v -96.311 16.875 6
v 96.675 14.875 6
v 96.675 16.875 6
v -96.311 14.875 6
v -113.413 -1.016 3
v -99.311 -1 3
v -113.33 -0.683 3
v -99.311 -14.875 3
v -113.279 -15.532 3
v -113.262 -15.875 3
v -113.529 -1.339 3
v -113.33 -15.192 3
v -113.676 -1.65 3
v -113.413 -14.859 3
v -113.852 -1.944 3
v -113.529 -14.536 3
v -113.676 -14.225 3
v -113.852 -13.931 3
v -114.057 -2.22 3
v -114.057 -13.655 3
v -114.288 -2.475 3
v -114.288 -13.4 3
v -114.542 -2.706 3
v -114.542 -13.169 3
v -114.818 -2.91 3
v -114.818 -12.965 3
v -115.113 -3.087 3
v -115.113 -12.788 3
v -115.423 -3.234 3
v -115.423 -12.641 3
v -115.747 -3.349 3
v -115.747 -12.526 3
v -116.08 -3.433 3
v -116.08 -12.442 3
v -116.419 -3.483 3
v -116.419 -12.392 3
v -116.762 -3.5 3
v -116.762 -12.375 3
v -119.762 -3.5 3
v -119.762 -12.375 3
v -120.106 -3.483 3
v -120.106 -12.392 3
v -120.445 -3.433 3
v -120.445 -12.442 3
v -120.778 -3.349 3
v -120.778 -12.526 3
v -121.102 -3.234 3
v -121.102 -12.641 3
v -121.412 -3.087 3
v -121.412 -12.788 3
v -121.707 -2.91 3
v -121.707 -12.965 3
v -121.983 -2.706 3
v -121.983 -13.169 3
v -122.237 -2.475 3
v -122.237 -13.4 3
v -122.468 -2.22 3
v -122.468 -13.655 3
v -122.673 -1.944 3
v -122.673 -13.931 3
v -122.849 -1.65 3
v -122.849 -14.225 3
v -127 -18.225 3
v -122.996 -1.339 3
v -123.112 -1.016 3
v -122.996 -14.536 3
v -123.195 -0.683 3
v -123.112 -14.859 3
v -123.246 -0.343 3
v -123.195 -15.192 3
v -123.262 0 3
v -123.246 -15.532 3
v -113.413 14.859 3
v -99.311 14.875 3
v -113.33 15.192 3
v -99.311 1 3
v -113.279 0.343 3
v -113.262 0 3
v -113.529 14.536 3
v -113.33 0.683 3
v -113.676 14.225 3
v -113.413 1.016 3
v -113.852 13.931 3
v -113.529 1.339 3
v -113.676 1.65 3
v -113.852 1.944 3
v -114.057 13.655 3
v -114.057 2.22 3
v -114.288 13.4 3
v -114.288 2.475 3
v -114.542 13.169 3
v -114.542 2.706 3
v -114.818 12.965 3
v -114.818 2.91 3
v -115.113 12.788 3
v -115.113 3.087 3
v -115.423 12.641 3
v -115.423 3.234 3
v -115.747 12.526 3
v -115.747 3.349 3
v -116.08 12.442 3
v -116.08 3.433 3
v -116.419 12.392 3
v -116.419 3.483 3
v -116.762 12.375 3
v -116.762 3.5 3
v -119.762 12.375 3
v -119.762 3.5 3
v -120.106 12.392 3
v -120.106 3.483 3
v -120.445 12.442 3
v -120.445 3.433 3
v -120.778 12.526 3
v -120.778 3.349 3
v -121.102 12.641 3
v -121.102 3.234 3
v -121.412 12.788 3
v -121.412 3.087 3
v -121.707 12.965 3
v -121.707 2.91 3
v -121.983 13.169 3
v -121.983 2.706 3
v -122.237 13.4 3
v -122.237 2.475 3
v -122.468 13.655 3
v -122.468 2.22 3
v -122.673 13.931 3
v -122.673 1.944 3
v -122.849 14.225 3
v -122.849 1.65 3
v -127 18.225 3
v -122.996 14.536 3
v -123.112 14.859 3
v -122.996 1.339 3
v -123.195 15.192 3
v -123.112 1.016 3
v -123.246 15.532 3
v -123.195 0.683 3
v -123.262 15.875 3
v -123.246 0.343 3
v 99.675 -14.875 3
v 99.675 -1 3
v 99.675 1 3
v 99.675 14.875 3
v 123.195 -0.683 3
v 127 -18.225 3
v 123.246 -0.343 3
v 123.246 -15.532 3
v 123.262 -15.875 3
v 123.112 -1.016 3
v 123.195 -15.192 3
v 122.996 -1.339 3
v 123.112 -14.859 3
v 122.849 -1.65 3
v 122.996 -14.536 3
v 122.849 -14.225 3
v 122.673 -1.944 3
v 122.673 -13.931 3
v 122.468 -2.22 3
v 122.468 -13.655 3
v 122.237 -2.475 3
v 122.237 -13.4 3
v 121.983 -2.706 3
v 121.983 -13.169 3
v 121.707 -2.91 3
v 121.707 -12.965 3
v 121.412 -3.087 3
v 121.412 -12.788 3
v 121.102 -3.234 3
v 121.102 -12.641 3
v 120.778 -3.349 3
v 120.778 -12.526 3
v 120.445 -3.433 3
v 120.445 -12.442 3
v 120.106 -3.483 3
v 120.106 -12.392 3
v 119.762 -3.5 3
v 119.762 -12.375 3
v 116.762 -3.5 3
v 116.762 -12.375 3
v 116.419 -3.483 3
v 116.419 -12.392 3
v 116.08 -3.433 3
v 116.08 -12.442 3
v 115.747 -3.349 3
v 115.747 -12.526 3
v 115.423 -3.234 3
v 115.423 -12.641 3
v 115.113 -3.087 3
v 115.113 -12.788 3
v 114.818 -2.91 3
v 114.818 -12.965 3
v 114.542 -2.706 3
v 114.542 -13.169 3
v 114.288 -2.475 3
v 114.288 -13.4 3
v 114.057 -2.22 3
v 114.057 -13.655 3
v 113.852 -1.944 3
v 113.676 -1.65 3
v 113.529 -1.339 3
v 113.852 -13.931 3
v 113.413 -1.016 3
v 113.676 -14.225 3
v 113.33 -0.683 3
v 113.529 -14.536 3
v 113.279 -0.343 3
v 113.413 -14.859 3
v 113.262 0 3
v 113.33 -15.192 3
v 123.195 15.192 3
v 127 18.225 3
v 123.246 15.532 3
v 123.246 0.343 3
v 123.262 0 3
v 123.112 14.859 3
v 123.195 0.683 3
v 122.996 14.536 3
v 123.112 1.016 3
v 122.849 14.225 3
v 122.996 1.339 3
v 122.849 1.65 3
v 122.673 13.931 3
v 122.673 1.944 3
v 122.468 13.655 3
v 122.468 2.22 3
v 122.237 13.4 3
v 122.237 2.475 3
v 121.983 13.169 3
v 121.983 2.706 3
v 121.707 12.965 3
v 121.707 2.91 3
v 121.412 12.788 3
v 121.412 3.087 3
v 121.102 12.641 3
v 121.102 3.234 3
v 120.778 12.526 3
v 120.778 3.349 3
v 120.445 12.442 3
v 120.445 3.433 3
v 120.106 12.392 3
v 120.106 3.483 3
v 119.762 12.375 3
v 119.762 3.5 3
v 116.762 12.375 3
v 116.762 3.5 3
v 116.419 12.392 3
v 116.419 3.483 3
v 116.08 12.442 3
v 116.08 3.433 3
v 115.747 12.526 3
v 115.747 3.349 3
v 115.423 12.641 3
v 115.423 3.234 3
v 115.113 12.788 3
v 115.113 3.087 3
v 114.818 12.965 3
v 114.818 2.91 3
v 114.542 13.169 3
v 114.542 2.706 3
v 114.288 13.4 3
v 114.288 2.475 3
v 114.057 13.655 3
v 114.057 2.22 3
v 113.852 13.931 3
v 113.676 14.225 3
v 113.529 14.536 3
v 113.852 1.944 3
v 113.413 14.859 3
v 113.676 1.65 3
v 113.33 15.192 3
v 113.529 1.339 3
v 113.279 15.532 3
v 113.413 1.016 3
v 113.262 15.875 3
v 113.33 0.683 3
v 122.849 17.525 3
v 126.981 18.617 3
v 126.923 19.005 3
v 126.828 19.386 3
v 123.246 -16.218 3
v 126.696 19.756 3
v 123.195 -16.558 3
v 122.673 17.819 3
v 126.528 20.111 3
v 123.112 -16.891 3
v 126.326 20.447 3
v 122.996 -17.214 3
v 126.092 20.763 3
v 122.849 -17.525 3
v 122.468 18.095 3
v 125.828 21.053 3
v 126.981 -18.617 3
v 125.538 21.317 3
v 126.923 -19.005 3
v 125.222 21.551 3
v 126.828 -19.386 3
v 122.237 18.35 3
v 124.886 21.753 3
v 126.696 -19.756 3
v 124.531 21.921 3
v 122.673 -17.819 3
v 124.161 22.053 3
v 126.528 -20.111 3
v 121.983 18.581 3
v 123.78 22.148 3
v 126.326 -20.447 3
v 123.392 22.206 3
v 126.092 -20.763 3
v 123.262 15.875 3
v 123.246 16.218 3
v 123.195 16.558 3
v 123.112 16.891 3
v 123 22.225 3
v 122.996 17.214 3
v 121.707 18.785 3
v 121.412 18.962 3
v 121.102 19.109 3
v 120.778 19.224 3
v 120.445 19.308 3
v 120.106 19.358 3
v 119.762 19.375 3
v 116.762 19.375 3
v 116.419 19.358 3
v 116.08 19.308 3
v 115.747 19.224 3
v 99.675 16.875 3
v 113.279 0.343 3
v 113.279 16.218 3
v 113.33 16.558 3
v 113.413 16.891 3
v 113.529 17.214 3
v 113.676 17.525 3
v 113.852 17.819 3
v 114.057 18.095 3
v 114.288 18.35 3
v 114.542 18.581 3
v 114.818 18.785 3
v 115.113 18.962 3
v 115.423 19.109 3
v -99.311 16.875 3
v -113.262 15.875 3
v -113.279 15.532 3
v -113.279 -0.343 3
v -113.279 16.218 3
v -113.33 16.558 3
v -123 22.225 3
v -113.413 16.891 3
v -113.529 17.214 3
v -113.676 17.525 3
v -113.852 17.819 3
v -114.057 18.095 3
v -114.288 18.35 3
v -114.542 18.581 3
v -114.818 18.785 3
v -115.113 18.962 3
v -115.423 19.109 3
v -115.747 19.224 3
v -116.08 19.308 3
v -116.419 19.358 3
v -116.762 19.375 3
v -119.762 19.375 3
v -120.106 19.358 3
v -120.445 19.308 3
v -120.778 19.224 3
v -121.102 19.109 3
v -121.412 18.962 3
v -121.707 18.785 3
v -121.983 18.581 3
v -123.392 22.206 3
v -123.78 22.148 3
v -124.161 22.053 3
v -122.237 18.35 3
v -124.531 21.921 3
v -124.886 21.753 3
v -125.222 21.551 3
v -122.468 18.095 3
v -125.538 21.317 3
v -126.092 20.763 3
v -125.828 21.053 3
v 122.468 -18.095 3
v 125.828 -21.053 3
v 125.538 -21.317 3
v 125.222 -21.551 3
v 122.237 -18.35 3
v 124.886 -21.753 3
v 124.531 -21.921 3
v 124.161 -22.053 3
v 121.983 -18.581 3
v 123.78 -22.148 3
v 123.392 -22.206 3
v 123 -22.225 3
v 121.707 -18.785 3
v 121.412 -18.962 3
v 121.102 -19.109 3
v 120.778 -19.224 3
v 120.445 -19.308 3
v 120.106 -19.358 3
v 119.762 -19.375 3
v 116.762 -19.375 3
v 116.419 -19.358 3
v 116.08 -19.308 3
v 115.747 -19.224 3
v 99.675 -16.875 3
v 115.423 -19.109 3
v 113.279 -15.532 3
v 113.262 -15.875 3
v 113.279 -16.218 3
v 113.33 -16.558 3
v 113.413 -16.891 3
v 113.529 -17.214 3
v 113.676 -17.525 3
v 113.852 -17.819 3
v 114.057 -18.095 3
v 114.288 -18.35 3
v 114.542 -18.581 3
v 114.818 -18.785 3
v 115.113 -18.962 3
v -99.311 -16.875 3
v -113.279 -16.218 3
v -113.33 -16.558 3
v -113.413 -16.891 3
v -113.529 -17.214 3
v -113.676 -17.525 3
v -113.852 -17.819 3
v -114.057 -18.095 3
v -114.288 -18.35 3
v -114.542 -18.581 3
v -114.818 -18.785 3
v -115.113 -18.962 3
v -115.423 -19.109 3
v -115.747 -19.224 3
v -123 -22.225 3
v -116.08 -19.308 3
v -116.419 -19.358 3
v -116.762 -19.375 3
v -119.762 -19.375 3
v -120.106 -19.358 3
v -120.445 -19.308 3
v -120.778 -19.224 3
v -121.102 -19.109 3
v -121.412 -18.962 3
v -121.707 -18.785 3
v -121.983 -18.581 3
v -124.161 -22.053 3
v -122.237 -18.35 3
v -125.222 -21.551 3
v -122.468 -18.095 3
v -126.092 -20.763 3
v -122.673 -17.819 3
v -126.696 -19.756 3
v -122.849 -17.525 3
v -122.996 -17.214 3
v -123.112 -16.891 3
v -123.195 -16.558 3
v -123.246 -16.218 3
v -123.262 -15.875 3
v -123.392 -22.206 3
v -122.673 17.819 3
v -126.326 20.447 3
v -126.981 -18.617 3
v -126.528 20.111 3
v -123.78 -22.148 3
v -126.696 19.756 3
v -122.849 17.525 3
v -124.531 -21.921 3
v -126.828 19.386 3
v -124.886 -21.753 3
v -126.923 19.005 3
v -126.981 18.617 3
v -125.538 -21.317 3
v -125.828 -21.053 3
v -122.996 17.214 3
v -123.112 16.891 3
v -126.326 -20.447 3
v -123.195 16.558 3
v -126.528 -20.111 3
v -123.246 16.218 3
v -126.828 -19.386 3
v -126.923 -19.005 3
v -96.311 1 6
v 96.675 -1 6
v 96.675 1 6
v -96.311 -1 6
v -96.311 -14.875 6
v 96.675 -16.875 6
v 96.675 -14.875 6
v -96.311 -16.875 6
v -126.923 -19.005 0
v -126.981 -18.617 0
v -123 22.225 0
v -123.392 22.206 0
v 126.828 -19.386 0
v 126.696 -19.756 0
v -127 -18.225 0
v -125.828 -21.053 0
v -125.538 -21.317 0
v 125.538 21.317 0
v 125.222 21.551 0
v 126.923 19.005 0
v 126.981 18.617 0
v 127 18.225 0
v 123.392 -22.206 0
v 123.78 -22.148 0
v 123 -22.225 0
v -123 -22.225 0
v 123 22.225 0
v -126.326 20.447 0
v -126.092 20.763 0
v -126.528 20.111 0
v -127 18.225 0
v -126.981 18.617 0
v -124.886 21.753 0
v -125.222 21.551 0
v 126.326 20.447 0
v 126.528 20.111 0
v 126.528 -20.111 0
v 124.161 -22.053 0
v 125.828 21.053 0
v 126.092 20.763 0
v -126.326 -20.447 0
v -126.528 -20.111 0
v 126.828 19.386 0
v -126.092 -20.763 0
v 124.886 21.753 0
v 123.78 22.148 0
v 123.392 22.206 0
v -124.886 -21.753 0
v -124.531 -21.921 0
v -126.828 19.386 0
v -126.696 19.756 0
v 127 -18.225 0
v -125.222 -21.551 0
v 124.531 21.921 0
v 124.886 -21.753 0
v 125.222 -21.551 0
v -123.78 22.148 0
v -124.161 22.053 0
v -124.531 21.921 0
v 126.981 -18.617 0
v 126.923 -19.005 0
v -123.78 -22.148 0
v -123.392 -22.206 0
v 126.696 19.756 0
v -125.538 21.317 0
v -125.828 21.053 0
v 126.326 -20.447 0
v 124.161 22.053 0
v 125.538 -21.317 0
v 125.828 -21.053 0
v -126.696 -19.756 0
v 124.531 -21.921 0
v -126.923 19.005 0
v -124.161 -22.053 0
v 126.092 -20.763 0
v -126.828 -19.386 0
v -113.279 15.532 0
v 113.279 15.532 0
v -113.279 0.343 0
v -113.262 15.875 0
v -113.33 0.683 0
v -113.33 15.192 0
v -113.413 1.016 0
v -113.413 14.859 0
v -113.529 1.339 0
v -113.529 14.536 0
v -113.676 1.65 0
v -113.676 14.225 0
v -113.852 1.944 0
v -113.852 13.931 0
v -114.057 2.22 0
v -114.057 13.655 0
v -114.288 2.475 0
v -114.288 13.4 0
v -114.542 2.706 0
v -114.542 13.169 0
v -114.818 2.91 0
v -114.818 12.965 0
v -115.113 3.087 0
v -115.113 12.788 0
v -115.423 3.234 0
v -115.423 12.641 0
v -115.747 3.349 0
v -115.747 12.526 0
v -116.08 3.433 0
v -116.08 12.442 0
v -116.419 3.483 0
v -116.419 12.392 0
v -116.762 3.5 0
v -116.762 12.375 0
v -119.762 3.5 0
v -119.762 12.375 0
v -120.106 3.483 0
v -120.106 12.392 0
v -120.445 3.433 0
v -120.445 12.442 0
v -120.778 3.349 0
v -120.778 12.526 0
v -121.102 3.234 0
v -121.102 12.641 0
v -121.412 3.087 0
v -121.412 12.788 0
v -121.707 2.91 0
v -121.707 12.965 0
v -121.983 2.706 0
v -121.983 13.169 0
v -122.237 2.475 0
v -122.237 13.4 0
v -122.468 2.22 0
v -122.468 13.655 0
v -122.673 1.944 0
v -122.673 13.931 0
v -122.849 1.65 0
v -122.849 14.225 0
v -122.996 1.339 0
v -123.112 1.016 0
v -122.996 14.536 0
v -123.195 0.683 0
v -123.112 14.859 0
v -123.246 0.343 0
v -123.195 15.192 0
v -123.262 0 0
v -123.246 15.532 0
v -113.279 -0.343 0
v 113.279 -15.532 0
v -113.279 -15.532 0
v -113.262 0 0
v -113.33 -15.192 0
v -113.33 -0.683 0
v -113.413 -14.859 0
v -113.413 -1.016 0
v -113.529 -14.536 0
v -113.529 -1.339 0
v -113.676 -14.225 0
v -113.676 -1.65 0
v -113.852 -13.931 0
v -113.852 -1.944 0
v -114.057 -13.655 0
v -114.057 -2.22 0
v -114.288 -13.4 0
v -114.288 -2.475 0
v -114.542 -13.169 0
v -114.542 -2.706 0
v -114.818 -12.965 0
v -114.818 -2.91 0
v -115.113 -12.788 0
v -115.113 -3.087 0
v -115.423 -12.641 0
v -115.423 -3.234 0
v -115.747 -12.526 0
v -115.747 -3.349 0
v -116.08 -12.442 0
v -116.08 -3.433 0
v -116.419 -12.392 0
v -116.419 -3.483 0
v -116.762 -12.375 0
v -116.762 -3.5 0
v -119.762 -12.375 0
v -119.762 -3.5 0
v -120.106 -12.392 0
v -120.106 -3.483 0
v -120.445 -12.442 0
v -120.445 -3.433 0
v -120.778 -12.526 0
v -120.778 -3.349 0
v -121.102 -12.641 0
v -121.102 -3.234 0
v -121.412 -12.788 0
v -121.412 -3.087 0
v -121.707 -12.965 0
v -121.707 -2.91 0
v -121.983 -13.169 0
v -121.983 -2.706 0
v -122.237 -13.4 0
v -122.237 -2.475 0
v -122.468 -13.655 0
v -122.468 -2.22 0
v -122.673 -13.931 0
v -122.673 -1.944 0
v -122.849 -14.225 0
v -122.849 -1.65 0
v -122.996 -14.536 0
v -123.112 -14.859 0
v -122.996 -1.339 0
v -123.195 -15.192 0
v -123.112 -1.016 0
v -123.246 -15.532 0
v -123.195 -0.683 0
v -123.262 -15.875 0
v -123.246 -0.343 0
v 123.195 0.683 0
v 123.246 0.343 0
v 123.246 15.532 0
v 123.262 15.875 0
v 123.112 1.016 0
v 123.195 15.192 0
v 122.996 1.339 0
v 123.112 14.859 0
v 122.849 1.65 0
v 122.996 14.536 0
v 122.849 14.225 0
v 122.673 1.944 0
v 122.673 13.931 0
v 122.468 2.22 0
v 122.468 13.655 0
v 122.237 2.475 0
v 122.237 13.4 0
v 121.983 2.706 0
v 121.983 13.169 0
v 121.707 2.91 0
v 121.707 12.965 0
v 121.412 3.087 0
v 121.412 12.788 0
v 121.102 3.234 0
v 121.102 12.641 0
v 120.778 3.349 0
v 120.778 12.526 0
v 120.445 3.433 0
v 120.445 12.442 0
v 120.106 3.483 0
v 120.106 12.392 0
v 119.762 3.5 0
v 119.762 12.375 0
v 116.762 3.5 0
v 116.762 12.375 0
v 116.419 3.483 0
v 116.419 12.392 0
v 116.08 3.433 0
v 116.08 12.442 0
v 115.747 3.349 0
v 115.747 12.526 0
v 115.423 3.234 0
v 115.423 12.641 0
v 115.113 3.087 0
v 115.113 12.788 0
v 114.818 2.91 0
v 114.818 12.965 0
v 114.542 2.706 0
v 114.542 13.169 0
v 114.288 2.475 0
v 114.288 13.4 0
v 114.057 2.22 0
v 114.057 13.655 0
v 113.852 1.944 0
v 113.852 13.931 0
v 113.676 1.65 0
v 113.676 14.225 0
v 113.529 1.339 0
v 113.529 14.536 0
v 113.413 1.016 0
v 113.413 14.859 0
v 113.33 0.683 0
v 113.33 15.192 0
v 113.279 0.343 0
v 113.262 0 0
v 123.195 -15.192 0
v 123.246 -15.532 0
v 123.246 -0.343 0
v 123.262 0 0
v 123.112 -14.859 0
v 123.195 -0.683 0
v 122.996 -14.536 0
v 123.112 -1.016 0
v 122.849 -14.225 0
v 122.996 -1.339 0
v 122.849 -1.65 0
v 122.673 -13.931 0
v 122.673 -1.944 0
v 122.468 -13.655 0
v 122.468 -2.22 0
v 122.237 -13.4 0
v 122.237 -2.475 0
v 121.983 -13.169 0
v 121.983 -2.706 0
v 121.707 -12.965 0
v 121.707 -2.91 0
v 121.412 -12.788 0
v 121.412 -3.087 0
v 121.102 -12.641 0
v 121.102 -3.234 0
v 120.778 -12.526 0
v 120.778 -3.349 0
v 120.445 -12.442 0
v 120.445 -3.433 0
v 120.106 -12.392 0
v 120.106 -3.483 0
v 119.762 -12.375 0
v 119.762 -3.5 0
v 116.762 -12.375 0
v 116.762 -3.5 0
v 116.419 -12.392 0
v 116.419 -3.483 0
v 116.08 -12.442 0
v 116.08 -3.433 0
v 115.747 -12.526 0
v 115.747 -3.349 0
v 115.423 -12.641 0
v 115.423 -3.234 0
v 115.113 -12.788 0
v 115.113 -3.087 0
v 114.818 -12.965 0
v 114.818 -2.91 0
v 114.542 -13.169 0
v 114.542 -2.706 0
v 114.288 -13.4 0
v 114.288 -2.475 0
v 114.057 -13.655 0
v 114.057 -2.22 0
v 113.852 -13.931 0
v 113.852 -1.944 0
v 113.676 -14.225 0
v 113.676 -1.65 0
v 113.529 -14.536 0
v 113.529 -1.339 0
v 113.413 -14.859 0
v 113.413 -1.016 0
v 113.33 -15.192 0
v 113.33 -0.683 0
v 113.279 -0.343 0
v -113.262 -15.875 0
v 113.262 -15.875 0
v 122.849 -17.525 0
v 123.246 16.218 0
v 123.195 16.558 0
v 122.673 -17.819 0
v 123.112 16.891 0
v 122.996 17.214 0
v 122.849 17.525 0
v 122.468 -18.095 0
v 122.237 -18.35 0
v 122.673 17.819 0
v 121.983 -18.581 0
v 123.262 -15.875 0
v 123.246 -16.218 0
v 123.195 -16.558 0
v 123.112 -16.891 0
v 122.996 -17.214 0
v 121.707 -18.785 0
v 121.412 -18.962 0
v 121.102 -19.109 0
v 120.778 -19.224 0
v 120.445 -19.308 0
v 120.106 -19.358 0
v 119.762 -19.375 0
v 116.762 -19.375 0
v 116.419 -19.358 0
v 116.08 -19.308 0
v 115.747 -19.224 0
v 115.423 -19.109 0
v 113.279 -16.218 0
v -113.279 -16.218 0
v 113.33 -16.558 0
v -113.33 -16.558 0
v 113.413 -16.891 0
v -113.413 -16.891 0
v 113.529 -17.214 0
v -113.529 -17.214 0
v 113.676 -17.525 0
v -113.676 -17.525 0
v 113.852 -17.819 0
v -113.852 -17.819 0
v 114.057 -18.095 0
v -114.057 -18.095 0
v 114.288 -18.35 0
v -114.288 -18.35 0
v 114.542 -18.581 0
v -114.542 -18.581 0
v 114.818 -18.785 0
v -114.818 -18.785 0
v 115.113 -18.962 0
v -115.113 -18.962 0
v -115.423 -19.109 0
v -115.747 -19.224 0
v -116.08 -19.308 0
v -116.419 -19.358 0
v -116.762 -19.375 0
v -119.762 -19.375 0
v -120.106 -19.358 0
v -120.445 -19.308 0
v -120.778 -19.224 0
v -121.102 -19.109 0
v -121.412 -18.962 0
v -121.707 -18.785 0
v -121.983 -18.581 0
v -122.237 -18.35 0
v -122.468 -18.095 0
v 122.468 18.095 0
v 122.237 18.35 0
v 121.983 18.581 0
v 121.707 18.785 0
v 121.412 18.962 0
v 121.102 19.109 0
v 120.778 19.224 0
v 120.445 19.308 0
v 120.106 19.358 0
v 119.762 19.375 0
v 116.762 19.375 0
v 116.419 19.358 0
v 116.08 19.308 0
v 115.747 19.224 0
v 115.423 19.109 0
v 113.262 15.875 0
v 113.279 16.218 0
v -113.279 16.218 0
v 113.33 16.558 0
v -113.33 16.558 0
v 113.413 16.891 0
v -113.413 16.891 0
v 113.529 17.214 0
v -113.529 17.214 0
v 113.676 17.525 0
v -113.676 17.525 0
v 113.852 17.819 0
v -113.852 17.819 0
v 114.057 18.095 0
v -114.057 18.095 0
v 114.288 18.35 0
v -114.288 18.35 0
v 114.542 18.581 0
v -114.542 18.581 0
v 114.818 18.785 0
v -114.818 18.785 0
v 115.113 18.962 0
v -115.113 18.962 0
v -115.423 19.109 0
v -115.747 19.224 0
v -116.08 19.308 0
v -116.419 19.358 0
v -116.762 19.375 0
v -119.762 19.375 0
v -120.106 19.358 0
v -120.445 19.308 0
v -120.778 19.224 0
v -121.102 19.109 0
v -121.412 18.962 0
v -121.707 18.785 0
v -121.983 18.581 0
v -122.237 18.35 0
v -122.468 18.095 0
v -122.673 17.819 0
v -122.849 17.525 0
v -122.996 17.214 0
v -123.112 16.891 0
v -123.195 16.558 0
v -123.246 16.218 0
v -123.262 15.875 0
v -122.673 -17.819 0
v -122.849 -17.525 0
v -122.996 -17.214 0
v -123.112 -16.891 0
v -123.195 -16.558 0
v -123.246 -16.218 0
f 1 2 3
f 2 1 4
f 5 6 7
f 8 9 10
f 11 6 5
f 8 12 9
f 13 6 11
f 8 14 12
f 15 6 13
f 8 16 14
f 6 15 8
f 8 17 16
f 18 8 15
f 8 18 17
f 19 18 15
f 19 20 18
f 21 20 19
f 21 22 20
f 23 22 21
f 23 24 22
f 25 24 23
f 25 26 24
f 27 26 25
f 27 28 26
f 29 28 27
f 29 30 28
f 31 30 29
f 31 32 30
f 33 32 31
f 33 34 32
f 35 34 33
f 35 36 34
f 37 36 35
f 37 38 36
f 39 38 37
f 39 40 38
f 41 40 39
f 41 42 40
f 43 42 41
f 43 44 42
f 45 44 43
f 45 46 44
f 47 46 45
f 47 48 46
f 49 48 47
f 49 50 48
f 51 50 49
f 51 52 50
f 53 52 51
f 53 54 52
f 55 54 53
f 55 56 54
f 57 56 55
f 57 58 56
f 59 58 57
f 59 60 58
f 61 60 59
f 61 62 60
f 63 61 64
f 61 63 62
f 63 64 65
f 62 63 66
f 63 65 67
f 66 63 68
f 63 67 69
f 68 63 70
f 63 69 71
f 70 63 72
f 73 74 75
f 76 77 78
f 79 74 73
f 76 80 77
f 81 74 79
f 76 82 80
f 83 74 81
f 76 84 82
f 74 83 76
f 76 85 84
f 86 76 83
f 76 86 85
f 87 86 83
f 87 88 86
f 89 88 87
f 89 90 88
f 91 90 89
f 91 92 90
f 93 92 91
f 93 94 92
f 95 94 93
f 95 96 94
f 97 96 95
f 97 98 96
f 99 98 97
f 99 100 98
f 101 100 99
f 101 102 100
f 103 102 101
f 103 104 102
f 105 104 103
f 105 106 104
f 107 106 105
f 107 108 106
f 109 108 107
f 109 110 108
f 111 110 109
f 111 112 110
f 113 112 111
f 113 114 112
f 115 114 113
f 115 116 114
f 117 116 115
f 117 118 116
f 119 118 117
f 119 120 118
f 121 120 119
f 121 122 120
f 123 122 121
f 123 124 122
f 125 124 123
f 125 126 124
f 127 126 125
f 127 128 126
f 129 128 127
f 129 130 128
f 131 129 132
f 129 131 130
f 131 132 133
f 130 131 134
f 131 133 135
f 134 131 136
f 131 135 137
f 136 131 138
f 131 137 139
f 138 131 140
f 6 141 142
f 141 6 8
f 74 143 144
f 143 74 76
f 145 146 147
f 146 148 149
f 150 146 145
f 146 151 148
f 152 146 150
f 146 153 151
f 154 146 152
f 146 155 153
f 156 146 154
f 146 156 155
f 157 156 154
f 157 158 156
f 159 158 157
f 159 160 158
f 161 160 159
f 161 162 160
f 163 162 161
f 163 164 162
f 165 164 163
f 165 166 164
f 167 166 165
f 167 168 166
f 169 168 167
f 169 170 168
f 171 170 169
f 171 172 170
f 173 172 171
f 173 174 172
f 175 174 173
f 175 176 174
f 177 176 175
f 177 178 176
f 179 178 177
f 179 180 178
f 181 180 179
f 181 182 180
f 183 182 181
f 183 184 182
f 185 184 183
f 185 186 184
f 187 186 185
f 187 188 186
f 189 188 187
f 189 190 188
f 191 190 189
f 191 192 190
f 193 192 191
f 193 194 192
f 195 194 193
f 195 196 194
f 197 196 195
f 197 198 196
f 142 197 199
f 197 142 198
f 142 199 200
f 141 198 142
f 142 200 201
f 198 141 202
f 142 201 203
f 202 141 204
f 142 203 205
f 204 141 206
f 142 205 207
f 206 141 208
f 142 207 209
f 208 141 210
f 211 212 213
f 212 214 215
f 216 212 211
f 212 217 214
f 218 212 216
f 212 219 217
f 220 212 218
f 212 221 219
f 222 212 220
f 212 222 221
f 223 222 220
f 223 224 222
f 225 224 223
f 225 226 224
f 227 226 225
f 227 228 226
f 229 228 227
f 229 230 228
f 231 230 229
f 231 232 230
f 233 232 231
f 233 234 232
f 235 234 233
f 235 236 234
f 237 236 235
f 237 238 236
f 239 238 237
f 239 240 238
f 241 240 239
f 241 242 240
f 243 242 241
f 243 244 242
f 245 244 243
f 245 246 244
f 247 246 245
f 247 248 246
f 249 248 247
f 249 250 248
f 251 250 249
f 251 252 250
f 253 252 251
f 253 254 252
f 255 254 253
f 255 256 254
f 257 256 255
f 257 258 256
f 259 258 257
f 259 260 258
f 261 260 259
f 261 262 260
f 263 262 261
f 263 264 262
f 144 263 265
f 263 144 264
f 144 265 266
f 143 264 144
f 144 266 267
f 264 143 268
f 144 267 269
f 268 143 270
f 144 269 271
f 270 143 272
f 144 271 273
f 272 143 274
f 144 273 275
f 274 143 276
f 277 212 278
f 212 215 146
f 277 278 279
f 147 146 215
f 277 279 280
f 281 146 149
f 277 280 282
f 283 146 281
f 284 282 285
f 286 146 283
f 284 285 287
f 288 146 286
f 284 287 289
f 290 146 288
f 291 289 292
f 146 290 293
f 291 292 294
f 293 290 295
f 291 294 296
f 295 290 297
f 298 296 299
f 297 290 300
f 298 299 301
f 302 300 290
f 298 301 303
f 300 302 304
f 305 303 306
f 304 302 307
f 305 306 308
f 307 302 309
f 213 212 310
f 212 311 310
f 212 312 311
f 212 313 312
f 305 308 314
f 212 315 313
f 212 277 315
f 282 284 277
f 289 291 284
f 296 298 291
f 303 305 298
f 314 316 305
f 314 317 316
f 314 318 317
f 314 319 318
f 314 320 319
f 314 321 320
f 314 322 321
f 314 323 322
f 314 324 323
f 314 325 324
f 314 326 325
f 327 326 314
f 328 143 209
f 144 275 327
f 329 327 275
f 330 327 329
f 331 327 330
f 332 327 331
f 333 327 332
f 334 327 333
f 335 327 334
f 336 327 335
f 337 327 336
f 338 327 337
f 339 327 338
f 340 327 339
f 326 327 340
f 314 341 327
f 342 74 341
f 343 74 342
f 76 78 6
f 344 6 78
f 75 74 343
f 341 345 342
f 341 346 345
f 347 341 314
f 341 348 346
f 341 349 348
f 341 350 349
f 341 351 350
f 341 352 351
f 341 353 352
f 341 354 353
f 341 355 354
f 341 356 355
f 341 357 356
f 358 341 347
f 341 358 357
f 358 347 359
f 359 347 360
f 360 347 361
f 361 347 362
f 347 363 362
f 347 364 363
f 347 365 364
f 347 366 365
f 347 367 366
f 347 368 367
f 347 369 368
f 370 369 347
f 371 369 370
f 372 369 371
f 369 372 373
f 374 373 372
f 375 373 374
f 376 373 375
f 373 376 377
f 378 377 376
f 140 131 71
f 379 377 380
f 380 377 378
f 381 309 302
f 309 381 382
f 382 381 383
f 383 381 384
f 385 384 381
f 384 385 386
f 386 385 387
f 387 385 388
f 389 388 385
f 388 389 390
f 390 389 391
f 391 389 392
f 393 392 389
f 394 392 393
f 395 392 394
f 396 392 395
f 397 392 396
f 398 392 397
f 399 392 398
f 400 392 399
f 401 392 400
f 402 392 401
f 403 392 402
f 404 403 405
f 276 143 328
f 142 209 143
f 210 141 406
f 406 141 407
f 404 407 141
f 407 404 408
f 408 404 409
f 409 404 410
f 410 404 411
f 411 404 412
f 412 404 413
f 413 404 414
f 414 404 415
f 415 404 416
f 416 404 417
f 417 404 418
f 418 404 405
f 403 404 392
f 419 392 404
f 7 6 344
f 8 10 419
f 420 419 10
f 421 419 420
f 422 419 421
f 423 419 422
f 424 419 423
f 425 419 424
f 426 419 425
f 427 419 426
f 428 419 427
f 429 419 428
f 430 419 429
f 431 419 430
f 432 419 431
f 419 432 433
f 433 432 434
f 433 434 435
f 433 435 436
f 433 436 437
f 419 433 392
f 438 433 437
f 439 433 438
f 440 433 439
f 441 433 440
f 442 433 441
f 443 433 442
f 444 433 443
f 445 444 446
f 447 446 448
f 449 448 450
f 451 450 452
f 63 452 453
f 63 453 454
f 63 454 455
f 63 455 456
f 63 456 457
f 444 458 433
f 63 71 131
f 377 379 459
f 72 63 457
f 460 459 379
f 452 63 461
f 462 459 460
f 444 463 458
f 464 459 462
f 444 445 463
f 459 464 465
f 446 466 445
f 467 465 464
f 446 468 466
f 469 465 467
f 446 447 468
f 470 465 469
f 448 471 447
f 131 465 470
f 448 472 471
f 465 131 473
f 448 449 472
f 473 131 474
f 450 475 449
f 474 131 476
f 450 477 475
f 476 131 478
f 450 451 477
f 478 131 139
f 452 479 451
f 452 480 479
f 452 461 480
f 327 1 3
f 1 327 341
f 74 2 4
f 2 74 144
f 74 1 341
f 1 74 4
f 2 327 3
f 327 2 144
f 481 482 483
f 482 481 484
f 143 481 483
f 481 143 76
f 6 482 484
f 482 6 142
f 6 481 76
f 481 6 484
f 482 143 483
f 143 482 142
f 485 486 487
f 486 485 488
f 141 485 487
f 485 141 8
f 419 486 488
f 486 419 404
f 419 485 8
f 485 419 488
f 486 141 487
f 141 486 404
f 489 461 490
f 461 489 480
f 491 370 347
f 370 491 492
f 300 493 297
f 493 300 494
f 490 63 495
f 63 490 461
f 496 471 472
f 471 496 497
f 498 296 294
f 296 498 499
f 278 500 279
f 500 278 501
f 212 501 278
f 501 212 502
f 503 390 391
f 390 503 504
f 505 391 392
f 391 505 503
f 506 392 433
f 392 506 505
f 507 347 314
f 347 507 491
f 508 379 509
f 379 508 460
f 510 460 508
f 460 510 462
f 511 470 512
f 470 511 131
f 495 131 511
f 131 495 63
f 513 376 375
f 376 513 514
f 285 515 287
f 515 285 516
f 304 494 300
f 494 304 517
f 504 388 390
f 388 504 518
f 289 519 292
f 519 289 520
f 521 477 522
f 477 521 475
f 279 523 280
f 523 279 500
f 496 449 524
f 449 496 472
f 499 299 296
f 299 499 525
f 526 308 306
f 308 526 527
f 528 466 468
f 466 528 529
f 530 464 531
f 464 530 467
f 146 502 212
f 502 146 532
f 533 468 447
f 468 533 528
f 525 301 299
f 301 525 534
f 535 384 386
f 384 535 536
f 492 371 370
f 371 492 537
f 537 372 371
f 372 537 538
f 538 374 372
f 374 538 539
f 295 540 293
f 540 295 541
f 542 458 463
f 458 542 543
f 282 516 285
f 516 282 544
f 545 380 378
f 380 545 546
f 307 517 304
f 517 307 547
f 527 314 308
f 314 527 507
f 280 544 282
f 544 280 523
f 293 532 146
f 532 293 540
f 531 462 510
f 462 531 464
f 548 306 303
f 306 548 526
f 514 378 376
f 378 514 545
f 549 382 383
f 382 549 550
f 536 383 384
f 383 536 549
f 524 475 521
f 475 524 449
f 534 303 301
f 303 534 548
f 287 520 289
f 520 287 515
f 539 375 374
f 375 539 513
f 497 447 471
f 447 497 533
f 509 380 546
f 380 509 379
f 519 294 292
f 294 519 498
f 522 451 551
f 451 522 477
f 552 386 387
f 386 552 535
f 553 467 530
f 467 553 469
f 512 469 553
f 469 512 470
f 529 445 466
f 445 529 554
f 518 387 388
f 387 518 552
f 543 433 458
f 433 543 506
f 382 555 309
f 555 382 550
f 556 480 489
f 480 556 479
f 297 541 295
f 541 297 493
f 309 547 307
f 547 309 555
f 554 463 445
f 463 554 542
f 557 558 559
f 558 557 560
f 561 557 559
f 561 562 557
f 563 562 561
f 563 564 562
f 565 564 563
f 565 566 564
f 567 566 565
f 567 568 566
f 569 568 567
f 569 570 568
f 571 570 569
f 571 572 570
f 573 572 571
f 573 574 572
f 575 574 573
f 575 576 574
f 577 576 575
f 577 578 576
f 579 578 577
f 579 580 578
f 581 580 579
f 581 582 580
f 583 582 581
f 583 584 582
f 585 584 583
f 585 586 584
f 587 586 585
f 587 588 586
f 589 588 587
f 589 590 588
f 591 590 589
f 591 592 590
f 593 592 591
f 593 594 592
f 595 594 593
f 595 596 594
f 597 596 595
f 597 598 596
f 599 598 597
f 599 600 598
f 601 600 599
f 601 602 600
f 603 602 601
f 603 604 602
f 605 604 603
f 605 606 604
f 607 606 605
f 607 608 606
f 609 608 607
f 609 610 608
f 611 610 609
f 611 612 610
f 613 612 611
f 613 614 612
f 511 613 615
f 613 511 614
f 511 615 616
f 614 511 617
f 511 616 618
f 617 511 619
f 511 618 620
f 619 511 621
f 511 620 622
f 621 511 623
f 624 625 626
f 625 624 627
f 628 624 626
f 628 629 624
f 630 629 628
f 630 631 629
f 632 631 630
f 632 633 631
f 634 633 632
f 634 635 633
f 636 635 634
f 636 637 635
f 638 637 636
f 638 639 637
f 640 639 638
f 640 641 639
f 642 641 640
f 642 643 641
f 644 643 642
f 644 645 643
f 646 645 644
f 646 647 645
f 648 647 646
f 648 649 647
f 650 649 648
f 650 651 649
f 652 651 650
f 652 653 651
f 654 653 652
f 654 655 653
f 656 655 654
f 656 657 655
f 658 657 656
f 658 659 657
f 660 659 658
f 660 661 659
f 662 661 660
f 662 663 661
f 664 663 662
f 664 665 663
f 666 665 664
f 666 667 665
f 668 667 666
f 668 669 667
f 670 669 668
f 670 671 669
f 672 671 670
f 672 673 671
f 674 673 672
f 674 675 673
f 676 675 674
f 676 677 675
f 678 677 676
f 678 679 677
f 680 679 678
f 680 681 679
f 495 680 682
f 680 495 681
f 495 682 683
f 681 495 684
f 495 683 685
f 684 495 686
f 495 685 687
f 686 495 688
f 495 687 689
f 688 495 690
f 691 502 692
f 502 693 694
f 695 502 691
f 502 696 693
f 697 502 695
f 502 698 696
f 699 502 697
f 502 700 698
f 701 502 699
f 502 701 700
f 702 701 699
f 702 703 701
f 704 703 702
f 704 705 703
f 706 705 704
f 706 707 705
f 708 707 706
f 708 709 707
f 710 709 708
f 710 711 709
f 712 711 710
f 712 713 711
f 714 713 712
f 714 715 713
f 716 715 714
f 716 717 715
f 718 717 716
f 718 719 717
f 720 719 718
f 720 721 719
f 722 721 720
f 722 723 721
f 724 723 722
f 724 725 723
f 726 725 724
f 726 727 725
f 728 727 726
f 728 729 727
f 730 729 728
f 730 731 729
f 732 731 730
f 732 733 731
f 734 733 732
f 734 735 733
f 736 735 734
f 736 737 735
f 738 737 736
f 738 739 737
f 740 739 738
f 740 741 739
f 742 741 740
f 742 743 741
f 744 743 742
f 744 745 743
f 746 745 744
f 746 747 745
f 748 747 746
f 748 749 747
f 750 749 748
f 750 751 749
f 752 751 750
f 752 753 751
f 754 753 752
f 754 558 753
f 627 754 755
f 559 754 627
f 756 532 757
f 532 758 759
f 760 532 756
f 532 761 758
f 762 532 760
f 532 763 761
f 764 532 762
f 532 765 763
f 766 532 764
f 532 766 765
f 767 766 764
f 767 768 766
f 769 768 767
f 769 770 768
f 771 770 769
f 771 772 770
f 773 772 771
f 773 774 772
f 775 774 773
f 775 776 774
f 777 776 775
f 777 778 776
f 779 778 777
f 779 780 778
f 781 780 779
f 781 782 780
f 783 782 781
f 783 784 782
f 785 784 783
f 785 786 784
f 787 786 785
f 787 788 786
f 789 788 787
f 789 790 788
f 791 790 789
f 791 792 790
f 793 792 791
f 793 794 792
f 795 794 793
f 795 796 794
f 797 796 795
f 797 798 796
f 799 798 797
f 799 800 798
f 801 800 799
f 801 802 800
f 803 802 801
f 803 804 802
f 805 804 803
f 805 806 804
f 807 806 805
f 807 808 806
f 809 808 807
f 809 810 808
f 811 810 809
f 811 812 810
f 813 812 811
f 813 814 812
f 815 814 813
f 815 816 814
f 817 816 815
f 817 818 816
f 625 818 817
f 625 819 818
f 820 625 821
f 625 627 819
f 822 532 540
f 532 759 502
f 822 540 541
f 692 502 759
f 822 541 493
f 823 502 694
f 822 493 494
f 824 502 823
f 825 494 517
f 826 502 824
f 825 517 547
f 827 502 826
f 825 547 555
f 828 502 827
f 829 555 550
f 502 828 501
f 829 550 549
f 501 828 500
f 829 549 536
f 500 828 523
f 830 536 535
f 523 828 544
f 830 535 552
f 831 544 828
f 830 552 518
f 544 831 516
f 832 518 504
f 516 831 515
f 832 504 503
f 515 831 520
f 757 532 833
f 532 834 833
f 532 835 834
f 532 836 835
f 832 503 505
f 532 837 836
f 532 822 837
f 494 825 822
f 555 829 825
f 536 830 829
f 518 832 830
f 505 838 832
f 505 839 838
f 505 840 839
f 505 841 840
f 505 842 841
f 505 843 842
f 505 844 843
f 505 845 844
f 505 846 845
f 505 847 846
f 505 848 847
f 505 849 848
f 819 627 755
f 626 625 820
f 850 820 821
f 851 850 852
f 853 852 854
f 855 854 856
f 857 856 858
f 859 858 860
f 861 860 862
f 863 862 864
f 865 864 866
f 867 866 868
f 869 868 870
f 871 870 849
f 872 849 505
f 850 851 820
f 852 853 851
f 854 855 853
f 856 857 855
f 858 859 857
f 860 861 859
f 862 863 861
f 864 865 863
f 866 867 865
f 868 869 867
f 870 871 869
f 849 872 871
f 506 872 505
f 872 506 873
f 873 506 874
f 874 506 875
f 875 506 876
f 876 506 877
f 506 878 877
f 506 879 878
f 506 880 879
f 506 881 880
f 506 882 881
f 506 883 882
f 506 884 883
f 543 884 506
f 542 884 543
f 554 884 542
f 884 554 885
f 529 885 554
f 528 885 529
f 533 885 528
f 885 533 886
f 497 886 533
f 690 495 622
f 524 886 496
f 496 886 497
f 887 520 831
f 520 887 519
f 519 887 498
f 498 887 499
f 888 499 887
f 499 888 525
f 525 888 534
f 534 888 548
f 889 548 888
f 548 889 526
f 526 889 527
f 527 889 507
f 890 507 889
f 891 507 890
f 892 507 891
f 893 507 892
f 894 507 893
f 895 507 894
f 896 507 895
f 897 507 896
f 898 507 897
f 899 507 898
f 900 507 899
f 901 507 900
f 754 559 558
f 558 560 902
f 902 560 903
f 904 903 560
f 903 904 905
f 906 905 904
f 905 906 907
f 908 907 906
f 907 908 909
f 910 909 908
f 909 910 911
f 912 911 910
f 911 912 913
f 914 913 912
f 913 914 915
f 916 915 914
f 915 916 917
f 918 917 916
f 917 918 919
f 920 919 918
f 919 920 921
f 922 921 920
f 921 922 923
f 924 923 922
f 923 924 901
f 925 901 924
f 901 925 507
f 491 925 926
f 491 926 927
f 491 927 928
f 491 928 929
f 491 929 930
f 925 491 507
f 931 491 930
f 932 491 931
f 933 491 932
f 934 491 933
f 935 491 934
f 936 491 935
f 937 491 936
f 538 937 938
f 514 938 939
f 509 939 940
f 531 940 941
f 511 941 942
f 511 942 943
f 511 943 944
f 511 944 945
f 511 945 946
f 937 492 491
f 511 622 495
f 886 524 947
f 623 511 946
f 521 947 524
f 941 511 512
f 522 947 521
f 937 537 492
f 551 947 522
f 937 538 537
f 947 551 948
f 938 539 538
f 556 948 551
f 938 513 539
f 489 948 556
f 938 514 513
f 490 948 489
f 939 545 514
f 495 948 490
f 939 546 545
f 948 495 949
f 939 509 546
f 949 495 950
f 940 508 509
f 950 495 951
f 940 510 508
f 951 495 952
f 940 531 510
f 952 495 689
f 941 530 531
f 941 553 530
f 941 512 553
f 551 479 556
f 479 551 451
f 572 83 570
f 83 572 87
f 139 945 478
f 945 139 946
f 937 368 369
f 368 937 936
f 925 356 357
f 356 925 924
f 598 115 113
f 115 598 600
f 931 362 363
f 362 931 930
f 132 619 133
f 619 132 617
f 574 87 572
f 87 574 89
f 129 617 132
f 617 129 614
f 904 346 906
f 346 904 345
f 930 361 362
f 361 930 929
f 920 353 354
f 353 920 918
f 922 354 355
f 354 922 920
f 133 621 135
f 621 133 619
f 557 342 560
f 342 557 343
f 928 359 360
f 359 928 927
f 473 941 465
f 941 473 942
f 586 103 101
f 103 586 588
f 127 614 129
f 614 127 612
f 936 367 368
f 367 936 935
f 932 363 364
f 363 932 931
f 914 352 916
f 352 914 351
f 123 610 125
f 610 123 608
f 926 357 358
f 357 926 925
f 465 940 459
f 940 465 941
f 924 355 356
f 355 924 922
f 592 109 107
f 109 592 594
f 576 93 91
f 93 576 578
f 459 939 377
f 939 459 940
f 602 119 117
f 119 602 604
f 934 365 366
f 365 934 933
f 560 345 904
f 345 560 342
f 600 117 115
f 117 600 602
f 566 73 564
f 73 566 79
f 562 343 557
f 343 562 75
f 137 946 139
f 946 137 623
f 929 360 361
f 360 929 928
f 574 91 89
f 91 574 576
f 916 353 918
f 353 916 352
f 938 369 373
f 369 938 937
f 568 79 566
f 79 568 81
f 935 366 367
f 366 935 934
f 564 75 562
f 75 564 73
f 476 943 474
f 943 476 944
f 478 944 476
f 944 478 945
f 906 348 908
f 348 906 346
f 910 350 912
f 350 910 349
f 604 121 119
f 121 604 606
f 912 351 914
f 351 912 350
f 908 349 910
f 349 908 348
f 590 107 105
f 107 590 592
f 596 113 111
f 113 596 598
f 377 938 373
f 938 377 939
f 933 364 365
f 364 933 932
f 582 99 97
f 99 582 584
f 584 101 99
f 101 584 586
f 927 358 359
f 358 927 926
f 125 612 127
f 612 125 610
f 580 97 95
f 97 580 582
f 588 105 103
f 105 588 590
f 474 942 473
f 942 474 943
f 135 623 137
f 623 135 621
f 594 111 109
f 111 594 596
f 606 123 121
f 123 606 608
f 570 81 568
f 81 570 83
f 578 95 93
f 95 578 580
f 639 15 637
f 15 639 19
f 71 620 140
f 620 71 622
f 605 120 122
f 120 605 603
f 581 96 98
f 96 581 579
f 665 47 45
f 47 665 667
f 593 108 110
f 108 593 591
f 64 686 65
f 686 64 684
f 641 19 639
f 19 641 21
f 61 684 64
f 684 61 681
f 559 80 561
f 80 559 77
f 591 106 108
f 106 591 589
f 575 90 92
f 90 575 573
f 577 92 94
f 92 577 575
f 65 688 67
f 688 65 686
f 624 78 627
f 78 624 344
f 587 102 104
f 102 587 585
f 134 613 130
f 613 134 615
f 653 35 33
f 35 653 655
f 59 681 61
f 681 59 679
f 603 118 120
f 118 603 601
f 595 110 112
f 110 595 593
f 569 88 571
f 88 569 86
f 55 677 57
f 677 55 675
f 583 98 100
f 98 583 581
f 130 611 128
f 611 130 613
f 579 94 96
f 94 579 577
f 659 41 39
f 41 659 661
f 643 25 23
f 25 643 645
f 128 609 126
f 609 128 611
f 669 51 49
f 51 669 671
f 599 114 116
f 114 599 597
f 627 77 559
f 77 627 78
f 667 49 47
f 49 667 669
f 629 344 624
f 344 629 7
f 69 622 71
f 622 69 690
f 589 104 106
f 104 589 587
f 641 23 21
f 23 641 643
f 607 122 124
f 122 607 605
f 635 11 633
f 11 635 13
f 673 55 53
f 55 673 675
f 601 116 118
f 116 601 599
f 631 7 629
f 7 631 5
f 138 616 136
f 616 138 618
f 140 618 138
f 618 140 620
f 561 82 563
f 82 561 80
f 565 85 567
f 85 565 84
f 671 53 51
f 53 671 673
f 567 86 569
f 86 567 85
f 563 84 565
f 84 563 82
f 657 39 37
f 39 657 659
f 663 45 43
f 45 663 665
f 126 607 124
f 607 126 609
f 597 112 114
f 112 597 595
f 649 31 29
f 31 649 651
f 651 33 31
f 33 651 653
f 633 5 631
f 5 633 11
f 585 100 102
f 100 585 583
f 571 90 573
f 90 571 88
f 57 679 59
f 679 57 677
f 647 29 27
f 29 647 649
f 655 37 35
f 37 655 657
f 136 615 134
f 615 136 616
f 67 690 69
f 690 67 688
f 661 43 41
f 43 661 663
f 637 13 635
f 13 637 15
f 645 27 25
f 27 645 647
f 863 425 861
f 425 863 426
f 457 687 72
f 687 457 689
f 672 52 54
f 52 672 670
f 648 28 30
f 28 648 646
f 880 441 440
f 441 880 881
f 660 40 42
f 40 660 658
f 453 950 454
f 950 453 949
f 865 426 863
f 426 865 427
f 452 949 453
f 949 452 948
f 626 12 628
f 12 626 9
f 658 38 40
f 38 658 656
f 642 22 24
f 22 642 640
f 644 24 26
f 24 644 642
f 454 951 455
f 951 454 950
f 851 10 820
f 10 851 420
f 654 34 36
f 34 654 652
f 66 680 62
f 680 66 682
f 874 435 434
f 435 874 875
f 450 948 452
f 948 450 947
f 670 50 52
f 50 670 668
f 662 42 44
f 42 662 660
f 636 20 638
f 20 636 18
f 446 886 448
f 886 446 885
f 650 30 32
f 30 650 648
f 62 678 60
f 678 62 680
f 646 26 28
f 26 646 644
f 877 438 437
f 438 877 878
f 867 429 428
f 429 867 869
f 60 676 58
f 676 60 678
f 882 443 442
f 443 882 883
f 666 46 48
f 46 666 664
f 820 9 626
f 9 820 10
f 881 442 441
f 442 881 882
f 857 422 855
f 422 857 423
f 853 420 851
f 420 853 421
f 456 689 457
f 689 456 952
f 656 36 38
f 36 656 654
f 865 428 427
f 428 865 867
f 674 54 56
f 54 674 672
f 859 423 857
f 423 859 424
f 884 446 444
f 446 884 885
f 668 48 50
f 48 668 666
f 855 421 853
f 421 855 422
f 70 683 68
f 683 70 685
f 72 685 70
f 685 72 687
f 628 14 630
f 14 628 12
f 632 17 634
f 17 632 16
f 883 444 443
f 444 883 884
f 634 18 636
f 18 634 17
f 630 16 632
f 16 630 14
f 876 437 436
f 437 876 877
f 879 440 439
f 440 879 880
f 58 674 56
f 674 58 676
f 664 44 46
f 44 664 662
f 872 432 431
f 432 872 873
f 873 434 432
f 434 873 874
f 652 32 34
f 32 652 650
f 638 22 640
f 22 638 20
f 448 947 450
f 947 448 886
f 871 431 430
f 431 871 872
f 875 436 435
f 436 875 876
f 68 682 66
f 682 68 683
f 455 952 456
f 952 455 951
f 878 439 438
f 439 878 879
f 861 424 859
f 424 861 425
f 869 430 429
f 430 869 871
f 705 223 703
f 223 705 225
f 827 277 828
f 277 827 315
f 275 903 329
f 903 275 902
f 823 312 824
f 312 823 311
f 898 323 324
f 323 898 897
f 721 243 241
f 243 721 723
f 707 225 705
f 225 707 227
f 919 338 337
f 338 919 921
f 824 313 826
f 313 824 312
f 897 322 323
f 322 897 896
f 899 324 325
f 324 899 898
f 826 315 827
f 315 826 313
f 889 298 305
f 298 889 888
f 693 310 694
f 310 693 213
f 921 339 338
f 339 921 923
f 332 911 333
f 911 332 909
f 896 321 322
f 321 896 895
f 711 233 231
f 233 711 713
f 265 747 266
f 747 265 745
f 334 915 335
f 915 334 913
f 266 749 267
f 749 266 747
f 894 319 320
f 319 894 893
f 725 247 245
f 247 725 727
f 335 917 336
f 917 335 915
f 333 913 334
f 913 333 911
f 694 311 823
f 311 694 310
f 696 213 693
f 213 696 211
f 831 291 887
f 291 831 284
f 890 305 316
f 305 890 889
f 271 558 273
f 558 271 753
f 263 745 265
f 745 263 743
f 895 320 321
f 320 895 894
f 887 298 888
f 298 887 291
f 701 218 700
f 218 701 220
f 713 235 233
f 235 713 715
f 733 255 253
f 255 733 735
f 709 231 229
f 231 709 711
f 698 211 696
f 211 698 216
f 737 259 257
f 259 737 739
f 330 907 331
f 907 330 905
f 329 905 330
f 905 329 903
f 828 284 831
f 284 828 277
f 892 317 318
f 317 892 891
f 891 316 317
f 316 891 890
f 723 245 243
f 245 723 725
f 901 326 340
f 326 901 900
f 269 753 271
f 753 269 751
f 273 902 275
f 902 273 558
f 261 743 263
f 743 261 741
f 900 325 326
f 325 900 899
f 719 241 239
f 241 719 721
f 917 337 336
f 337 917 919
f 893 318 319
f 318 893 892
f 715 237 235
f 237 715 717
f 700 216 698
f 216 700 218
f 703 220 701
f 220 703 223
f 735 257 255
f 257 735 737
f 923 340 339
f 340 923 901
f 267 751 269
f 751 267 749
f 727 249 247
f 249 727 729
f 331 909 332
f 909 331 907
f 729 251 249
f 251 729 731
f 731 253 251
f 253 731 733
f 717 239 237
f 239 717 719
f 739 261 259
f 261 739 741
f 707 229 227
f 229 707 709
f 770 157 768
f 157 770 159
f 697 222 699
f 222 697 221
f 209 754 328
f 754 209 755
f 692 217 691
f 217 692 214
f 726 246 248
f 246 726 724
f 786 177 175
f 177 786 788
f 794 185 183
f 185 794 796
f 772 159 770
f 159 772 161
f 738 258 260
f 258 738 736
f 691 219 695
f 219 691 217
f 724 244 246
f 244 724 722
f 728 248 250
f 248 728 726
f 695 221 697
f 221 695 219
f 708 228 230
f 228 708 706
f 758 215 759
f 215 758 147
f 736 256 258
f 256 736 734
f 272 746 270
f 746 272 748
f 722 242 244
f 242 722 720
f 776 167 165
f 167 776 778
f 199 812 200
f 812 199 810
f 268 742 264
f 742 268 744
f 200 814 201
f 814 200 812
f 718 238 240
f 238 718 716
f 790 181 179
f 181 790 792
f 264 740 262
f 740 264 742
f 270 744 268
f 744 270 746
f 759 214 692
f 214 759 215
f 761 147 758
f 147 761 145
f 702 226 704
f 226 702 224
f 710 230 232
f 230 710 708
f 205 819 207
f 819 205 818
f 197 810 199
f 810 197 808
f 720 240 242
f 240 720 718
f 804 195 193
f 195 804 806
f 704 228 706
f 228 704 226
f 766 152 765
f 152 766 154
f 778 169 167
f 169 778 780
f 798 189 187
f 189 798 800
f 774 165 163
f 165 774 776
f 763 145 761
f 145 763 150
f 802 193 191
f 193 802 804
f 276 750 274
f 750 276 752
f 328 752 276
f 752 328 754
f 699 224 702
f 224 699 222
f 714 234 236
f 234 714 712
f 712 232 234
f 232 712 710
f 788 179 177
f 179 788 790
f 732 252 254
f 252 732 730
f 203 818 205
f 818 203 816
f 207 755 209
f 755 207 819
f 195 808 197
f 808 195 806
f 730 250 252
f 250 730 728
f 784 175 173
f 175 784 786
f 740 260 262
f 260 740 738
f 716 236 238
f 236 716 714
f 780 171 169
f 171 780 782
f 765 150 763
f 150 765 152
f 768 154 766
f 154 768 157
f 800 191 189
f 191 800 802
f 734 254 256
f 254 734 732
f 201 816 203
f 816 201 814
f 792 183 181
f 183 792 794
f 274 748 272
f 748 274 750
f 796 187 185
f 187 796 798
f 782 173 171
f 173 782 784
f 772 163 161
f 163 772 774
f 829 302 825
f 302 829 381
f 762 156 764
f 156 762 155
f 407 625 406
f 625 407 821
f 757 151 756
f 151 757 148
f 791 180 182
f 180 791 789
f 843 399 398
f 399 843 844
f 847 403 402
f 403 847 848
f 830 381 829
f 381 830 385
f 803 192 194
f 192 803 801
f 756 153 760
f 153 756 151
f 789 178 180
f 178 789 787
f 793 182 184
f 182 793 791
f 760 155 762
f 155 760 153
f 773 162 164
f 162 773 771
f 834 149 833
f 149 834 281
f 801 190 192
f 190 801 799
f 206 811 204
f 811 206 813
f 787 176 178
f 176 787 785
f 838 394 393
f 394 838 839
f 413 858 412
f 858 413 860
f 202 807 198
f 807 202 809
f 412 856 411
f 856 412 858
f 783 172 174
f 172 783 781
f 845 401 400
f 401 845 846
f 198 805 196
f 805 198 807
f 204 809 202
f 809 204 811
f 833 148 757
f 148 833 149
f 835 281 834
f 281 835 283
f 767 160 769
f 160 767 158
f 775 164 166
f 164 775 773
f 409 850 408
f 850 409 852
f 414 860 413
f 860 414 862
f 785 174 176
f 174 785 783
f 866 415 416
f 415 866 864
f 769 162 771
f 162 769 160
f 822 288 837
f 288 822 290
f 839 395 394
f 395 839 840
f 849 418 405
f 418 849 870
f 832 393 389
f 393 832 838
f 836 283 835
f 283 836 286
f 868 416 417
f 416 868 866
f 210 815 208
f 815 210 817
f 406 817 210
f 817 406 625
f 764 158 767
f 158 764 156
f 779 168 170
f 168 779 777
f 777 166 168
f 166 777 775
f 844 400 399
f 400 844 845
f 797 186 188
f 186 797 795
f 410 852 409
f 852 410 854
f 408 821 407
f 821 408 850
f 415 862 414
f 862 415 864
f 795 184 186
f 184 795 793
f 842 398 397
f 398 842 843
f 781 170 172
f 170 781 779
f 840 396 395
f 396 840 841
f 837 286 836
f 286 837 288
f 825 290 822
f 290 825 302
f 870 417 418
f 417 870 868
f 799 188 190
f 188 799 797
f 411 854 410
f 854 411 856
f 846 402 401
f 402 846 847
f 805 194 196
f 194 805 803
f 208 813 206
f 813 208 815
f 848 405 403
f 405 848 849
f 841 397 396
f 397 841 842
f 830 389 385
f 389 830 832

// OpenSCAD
// Rack Width 10 inch or 6 inch
rack_width = 254.0; // [ 254.0:10 inch, 152.4:6 inch]
// Height (measured in U)
rack_height = 1.0; // [0.5:0.5:5]
// Thickness of the front plate
front_thickness = 3.0;
// Radius for rounded corners on the front plate
corner_radius = 4.0;
half_height_holes = true; // [true:Show partial holes at edges, false:Hide partial holes]
//Adds additional strength
ribs = true; // [true:Show structural ribs, false:Hide structural ribs]
//Optional keystone jacks
keystones = 0; // [0:1:10]

/* [Hidden] */
height = 44.45 * rack_height;

tolerance = 0.42;

// Structural rib parameters
rib_thickness = 2.0;
rib_depth = 3.0;
rib_spacing = 15.0; // Distance between ribs
chamfer_size = 0.5; // Size of chamfer on rib edges

module keystone() {
    e=0.01;
    wall=2.5;
    front_hole_width=14.9;
    front_hole_height=16.3;
    front_hole_z_offset=4.28;
    front_hole_lip=0;

    jack_width=front_hole_width+wall;
    jack_height=25;
    jack_depth=9.7;
    front_large_catch_depth=3;
    front_chamfer_angle=50;

    back_hole_height=24.4;
    back_hole_z_offset=1.9;

    back_small_catch_length=2;
    back_small_catch_depth=1.4;

    back_large_catch_length=2.6;
    back_large_catch_depth=1.3;

    back_chamfer=1.2;

    translate([0, 0, jack_height + wall])
    mirror([0, 0, 1]) {
        union(){
            difference(){
                cube([jack_width+wall,jack_depth,jack_height+wall]);
                translate([(jack_width+wall-front_hole_width)/2,0,front_hole_z_offset])
                    cube([front_hole_width,jack_depth+wall,front_hole_height]);
                translate([(jack_width+wall-front_hole_width)/2,front_large_catch_depth,back_hole_z_offset])
                    cube([front_hole_width,jack_depth+wall-front_large_catch_depth,back_hole_height]);
                translate([wall + front_hole_width, 0, 0])
                    rotate([0, -90, 0])
                        linear_extrude(front_hole_width)
                            polygon([
                                [front_hole_z_offset + front_hole_height - e, front_hole_lip - e],
                                [front_hole_z_offset + front_hole_height + (front_large_catch_depth - front_hole_lip) * tan(front_chamfer_angle), front_large_catch_depth],
                                [front_hole_z_offset + front_hole_height - e, front_large_catch_depth]
                            ]);
                translate([jack_width+wall+e, 0, -e])
                    rotate([0, -90, 0])
                        linear_extrude(jack_width+wall+2*e)
                            polygon([[-e, jack_depth+e], [back_chamfer, jack_depth+e], [-e, jack_depth-back_chamfer]]);
                translate([jack_width+wall+e, 0, -e])
                    rotate([0, -90, 0])
                        linear_extrude(jack_width+wall+2*e)
                            polygon([[jack_height+wall+2*e, jack_depth+e], [jack_height+wall+2*e-back_chamfer, jack_depth+e], [jack_height+wall+2*e, jack_depth-back_chamfer]]);
                translate([0, 0, -e])
                    linear_extrude(jack_height+wall+2*e)
                        polygon([[-e, jack_depth+e], [back_chamfer, jack_depth+e], [-e, jack_depth-back_chamfer]]);
                translate([0, 0, -e])
                    linear_extrude(jack_height+wall+2*e)
                        polygon([[jack_width+wall+e, jack_depth+e], [jack_width+wall+e-back_chamfer, jack_depth+e], [jack_width+wall+e, jack_depth-back_chamfer]]);
                translate([(jack_width+wall)/2, 0.4, (front_hole_z_offset + front_hole_height + jack_height + wall) / 2])
                    rotate([90, 0, 0])
                        linear_extrude(height = 0.4+e)
                            polygon([[0, -2], [-2, 2], [2, 2]]);
            }
            translate([wall + front_hole_width, 0, 0])
                rotate([0, -90, 0])
                    linear_extrude(front_hole_width)
                        polygon([
                            [back_hole_z_offset + back_hole_height - back_small_catch_length, jack_depth - back_small_catch_depth],
                            [back_hole_z_offset + back_hole_height,                           jack_depth - back_small_catch_depth],
                            [back_hole_z_offset + back_hole_height,                           jack_depth],
                            [back_hole_z_offset + back_hole_height - back_small_catch_length, jack_depth]
                        ]);
            translate([wall + front_hole_width, 0, 0])
                rotate([0, -90, 0])
                    linear_extrude(front_hole_width)
                        polygon([
                            [back_hole_z_offset,                           jack_depth - back_large_catch_depth],
                            [back_hole_z_offset + back_large_catch_length, jack_depth - back_large_catch_depth],
                            [back_hole_z_offset + back_large_catch_length, jack_depth],
                            [back_hole_z_offset,                           jack_depth]
                        ]);
        }
    }
}

// The main module for the plate generator
module plate_generator() {
    $fn = 64;

    // Helper module for capsule-shaped slots (oval holes)
    module capsule_slot_2d(L, H) {
        hull() {
            translate([-L/2 + H/2, 0]) circle(r=H/2);
            translate([L/2 - H/2, 0]) circle(r=H/2);
        }
    }
    
    // Helper module for rounded rectangle
    module rounded_rect_2d(w, h, r) {
        hull() {
            translate([r, r]) circle(r=r);
            translate([w-r, r]) circle(r=r);
            translate([w-r, h-r]) circle(r=r);
            translate([r, h-r]) circle(r=r);
        }
    }
    
    // Helper module for simple chamfered rib (much faster)
    module chamfered_rib(width, thickness, depth, chamfer) {
        difference() {
            // Main rib body
            cube([width, thickness, depth]);
            
            // Large 45° chamfer to remove entire corner
            // Left end chamfer - dynamic positioning based on depth
            translate([depth - depth * 2, -tolerance, depth])
                rotate([0, 45, 0])
                    cube([depth * 1.5, thickness + 2*tolerance, depth * 1.5]);
            // Right end chamfer - dynamic positioning based on depth
            translate([width - depth + depth, -tolerance, 0])
                rotate([0, -45, 0])
                    cube([depth * 1.5, thickness + 2*tolerance, depth * 1.5]);
        }
    }

    // Create the main plate body
    module plate_body() {
        union() {
            // Main front plate
            linear_extrude(height = front_thickness) {
                rounded_rect_2d(rack_width, height, corner_radius);
            }
            // Structural ribs on the back (conditional)
            if (ribs) {
                structural_ribs();
            }
        }
    }
    
    // Create structural ribs within usable space constraints
    module structural_ribs() {
        // TODO: verify usable_width is correct
        //6 inch racks (mounts=152.4mm; rails=15.875mm; usable space=120.65mm)
        //10 inch racks (mounts=254.0mm; rails=15.875mm; usable space=221.5mm)
        // Use 90% of the usable width for safety margin
        usable_width = (rack_width == 152.4) ? 120.65 * 0.9 : 221.5 * 0.9;
        
        // Calculate rib positioning within usable space
        rib_start_x = (rack_width - usable_width) / 2;
        
        // Align bars with rack holes - same logic as hole positioning
        // Standard rack hole positions within each 1U (44.45mm) unit:
        // First hole: 6.35mm from top of U
        // Second hole: 22.225mm from top of U (middle)  
        // Third hole: 38.1mm from top of U (6.35mm from bottom)
        u_hole_positions = [6.35, 22.225, 38.1]; // positions within each U
        
        // Calculate maximum U units to consider - use same logic as holes
        max_u = ceil(rack_height);
        
        // Create ribs for each hole position that fits within the actual height
        for (u = [0:max_u-1]) {
            for (hole_pos = u_hole_positions) {
                // Calculate rib position from top of entire rack (same as hole logic)
                bar_y = height - (u * 44.45 + hole_pos);
                
                // Only create rib if the position is within the actual plate height
                // Use same logic as the holes: show if it fits within bounds
                if (bar_y >= rib_thickness/2 && bar_y <= height - rib_thickness/2) {
                    translate([rib_start_x, bar_y - rib_thickness/2, front_thickness]) {
                        chamfered_rib(usable_width, rib_thickness, rib_depth, chamfer_size);
                    }
                }
            }
        }
    }
    
    // Create all rack holes (copied from 10InchRackGenerator.scad)
    module all_rack_holes() {
        // Rack standard: 3 holes per U, with specific positioning
        // Each U is 44.45mm, holes are at specific positions within each U
        hole_spacing_x = (rack_width == 152.4) ? 136.526 : 236.525; // 6 inch : 10 inch rack
        hole_left_x = (rack_width - hole_spacing_x) / 2;
        hole_right_x = (rack_width + hole_spacing_x) / 2;

        // 10 inch rack = 10x7mm oval
        // 6 inch rack = 3.25 x 6.5mm oval
        slot_len = (rack_width == 152.4) ? 6.5 : 10.0;
        slot_height = (rack_width == 152.4) ? 3.25 : 7.0;

        // Standard rack hole positions within each 1U (44.45mm) unit:
        // First hole: 6.35mm from top of U
        // Second hole: 22.225mm from top of U (middle)
        // Third hole: 38.1mm from top of U (6.35mm from bottom)
        u_hole_positions = [6.35, 22.225, 38.1]; // positions within each U
        
        // Calculate how many full and partial U units we need to consider
        max_u = ceil(rack_height); // Include partial U units
        
        for (side_x = [hole_left_x, hole_right_x]) {
            for (u = [0:max_u-1]) {
                for (hole_pos = u_hole_positions) {
                    // Calculate hole position from top of entire rack
                    hole_y = height - (u * 44.45 + hole_pos);
                    // Always show holes that are at least partially within the rack height
                    // Always show holes fully inside the rack
                    fully_inside = (hole_y >= slot_height/2 && hole_y <= height - slot_height/2);
                    // Show partial holes at edge only if half_height_holes is true
                    partially_inside = (hole_y + slot_height/2 > 0 && hole_y - slot_height/2 < height);
                    show_hole = fully_inside || (half_height_holes && partially_inside && !fully_inside);
                    if (show_hole) {
                        translate([side_x, hole_y, 0]) {
                            linear_extrude(height = front_thickness + tolerance) {
                                capsule_slot_2d(slot_len, slot_height);
                            }
                        }
                    }
                }
            }
        }
    }

    // Keystone outer dimensions (must match keystone() module internals)
    // width = jack_width + wall = (14.9 + 2.5) + 2.5 = 19.9
    // height = jack_height + wall = 25 + 2.5 = 27.5
    ks_w = 19.9;
    ks_h = 27.5;
    ks_d = 9.7;

    // Rectangular cutouts through the plate face where keystone housings sit.
    // Required so the plate's solid material doesn't fill the keystone's internal holes.
    module keystone_cutouts() {
        if (keystones > 0) {
            for (i = [0:keystones-1]) {
                translate([
                    rack_width/2 - keystones*ks_w/2 + i*ks_w,
                    height/2 - ks_h/2,
                    -tolerance
                ])
                    cube([ks_w, ks_h, ks_d + 2*tolerance]);
            }
        }
    }

    // Keystone housings, front face flush with plate front (Z = 0).
    // rotate([90,0,0]) maps keystone depth (Y) to plate +Z, keystone height (Z) to plate -Y.
    module keystone_array() {
        if (keystones > 0) {
            for (i = [0:keystones-1]) {
                translate([
                    rack_width/2 - keystones*ks_w/2 + i*ks_w,
                    height/2 + ks_h/2,
                    0
                ])
                    rotate([90, 0, 0])
                        keystone();
            }
        }
    }

    // Main assembly
    translate([-rack_width/2, -height/2, 0]) {
        union() {
            difference() {
                plate_body();
                all_rack_holes();
                keystone_cutouts();
            }
            keystone_array();
        }
    }
}

if ($preview) {
    rotate([-90,0,0])
        translate([0, -height/2, -front_thickness/2])
            plate_generator();
} else {
    // Full render with details
    plate_generator();
}
